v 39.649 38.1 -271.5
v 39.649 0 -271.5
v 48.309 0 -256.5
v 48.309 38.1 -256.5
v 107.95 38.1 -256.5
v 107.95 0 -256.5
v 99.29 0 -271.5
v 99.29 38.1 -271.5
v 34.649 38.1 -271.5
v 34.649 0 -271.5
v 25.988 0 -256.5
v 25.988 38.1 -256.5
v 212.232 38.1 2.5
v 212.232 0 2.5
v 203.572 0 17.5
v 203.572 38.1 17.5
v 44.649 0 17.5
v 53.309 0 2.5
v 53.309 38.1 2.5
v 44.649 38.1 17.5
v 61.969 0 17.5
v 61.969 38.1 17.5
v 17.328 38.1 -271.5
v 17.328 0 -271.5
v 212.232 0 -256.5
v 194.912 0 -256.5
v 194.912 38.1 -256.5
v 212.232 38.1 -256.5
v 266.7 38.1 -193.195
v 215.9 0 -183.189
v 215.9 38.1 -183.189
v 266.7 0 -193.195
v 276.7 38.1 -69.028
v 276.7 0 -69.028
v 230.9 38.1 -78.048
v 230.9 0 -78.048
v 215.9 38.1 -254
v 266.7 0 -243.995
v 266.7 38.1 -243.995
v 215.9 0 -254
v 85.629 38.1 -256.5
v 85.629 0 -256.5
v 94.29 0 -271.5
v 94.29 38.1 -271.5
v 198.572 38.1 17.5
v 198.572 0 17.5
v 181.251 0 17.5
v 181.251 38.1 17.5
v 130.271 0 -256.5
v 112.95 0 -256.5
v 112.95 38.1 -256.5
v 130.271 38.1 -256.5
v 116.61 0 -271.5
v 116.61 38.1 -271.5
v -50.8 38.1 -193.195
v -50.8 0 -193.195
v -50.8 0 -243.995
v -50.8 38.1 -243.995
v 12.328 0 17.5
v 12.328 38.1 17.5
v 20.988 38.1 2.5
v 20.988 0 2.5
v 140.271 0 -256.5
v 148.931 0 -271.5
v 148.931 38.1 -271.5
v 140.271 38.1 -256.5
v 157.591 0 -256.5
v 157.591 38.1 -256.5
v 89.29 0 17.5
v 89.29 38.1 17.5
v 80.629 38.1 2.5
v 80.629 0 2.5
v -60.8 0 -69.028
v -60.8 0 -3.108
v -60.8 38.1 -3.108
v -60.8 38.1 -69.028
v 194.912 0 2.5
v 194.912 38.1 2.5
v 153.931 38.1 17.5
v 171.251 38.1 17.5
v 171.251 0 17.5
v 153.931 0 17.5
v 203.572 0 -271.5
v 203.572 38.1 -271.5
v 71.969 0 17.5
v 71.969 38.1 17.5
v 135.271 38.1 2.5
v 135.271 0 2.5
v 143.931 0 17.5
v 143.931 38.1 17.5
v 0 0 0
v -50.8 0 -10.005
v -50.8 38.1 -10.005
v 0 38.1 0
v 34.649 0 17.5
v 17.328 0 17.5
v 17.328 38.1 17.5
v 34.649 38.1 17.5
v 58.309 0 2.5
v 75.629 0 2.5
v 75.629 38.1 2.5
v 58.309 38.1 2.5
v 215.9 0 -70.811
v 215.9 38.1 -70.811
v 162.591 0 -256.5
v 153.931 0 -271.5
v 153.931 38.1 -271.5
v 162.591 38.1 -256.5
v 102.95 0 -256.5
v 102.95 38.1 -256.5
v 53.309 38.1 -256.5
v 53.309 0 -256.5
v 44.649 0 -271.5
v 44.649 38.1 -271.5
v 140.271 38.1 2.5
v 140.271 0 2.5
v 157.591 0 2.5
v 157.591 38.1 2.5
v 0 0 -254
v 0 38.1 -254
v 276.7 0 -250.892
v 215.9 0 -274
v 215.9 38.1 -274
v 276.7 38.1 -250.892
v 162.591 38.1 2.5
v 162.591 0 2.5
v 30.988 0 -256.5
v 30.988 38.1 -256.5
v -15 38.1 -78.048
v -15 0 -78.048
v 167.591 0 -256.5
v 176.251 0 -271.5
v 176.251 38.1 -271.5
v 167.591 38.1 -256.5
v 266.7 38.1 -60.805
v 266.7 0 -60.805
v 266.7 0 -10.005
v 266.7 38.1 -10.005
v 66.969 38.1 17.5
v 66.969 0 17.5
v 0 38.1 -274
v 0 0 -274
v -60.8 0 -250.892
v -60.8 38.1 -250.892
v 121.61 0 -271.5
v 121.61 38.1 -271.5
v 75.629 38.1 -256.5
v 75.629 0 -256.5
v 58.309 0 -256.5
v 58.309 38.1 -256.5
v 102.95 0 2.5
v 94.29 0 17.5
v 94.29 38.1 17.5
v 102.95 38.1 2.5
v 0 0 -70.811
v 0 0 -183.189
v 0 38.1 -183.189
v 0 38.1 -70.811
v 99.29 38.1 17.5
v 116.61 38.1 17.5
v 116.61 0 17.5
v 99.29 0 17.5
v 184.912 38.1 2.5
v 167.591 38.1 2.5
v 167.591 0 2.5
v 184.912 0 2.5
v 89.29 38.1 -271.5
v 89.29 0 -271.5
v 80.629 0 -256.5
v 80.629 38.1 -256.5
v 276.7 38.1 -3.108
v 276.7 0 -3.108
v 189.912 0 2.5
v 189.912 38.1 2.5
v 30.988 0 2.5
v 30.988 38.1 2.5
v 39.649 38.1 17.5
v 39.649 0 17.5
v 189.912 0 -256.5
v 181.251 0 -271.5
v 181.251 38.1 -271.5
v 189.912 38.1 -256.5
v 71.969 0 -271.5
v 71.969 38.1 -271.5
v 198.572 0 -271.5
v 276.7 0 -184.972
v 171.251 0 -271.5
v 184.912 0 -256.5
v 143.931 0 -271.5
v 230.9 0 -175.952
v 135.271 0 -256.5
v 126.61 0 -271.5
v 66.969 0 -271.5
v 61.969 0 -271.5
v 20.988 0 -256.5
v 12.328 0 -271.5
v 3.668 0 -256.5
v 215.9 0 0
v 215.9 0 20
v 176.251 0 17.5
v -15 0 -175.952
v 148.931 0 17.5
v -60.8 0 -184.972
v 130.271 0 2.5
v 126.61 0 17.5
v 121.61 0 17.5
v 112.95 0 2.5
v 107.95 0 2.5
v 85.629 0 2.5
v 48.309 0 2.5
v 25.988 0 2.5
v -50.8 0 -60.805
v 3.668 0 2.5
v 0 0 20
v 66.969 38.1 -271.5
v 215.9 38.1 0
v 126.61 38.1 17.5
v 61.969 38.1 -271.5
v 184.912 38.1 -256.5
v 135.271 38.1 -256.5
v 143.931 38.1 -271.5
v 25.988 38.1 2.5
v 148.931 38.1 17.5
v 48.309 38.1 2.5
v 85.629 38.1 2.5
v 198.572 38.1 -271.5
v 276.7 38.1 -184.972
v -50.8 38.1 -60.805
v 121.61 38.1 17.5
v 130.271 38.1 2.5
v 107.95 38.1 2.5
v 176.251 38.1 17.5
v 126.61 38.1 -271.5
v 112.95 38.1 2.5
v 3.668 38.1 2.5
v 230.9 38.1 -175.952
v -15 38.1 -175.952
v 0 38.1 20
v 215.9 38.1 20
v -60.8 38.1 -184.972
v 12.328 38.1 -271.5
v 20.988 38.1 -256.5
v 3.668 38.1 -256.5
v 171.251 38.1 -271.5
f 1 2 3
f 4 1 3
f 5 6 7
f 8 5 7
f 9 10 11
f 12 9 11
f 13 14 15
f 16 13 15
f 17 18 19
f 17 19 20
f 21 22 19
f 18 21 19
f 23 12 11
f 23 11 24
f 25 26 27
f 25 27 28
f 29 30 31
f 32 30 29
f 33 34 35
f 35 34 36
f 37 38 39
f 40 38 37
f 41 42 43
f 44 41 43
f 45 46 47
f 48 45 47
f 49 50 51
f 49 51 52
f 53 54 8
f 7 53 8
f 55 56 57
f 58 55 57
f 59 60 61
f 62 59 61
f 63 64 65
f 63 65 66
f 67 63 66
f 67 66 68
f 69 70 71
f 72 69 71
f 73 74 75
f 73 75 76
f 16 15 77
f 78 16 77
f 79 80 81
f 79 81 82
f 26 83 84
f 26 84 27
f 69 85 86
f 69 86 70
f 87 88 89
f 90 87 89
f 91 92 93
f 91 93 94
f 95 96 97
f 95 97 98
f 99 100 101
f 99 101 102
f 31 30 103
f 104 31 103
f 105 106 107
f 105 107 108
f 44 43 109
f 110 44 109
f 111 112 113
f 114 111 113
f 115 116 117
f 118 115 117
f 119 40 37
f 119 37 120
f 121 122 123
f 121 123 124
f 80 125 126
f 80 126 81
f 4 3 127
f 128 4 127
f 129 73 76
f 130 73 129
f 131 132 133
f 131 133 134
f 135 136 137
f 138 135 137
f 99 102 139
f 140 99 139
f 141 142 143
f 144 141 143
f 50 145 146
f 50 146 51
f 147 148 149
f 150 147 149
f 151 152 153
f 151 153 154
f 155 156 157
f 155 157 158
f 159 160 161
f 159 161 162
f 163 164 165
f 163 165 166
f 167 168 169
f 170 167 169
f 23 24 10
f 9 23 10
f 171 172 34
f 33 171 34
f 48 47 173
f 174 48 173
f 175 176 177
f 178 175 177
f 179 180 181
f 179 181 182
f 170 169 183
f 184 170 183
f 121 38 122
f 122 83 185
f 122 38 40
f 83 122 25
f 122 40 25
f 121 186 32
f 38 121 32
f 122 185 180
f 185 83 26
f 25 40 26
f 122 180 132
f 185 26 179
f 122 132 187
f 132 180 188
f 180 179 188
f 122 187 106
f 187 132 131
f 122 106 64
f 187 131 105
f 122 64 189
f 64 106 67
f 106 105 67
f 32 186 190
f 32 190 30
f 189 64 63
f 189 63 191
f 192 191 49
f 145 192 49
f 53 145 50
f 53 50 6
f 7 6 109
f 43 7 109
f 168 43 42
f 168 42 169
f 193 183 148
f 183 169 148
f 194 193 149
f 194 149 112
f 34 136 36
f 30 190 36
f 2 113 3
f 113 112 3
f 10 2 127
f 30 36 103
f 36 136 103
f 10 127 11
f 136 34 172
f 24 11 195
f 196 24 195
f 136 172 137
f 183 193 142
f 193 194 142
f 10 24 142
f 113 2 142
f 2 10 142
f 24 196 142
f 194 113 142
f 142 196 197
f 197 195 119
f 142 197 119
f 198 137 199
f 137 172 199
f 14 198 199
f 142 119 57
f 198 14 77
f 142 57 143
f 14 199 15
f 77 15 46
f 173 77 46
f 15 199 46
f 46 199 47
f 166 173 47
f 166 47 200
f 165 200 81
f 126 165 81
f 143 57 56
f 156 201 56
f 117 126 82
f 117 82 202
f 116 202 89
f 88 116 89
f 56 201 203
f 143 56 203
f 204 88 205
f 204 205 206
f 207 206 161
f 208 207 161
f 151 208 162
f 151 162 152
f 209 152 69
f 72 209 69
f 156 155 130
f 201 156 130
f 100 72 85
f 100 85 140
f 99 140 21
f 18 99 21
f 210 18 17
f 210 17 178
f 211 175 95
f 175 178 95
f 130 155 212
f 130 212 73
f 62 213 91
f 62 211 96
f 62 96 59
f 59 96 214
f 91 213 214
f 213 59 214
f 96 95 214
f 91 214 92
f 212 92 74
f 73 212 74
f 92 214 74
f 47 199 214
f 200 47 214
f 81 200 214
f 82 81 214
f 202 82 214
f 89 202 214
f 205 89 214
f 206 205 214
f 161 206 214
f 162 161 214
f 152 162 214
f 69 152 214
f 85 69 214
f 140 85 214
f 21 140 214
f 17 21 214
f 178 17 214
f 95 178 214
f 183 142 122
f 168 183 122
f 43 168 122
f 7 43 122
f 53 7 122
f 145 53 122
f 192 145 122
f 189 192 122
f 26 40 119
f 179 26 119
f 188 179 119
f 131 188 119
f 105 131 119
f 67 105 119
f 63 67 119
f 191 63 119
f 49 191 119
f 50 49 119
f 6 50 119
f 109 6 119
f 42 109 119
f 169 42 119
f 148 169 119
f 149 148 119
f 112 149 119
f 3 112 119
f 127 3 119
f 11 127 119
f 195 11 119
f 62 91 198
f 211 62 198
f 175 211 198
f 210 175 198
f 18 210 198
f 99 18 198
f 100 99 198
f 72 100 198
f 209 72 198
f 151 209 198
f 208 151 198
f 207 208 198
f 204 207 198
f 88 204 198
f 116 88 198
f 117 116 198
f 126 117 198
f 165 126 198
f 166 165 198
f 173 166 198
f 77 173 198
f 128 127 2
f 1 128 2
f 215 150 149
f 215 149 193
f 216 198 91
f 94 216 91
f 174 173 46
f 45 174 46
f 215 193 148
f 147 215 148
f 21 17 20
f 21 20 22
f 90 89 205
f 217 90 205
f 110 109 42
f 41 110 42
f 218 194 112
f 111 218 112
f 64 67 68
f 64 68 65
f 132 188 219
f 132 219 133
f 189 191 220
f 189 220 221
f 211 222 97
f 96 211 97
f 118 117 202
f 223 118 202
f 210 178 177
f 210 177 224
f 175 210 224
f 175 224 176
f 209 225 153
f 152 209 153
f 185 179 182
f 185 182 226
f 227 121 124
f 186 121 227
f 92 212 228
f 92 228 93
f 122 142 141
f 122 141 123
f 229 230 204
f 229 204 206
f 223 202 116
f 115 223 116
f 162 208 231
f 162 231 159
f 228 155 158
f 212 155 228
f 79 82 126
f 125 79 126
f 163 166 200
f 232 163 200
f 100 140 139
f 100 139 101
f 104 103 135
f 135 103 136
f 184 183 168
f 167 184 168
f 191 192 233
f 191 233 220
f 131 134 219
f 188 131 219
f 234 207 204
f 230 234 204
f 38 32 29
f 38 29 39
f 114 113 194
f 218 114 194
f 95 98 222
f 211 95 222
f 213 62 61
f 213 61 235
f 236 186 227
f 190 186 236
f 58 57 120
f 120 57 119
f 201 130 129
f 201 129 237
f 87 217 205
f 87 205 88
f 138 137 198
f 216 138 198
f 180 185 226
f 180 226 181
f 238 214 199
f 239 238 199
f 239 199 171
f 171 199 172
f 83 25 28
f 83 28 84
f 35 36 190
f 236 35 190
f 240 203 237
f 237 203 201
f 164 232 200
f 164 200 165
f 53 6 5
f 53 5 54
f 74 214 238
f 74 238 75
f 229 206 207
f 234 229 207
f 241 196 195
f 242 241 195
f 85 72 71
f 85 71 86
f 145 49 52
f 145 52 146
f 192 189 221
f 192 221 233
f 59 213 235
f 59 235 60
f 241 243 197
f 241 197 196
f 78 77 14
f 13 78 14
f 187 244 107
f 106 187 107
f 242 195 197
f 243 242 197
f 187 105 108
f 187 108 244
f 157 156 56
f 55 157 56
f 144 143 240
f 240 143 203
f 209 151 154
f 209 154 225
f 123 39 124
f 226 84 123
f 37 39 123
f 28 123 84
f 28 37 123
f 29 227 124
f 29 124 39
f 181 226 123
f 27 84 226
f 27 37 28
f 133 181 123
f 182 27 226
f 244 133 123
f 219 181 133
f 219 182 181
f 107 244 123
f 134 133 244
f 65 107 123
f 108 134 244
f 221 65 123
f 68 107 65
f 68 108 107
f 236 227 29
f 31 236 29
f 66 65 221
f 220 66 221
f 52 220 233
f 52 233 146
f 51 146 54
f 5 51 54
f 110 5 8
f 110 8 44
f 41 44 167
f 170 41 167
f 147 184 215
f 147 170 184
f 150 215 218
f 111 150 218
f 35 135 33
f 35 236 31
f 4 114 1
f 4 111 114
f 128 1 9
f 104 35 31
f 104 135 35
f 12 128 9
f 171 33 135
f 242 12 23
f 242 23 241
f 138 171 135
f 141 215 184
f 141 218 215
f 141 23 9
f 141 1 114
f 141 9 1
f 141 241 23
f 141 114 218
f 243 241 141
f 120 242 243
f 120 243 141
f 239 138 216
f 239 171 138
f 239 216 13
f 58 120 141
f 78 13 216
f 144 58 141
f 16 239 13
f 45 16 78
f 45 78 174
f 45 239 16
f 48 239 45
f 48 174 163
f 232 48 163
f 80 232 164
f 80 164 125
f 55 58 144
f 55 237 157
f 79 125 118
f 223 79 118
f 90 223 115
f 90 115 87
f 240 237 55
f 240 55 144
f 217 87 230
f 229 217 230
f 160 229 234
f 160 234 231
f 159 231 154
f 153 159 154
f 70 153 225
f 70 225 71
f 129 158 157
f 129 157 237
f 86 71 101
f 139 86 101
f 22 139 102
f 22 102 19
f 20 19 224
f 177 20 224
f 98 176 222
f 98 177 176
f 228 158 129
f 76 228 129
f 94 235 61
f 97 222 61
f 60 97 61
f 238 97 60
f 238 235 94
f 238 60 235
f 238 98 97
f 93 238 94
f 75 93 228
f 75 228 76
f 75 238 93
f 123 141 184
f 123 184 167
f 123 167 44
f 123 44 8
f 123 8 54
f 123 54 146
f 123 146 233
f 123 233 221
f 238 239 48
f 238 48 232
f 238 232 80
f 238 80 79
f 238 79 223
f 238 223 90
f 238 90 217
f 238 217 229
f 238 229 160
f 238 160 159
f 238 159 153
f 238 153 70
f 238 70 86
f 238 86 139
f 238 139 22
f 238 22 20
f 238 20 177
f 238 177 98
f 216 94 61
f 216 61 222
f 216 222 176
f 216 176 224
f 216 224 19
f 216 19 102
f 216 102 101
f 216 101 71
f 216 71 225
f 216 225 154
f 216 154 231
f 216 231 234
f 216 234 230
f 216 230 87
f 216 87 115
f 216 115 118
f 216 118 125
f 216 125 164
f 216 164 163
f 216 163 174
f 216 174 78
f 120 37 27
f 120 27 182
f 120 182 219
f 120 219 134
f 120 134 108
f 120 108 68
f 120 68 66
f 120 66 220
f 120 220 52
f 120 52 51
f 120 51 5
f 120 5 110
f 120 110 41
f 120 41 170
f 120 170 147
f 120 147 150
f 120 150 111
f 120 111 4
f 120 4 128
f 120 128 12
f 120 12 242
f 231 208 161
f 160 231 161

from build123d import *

# Parameters (mm, degrees)
BOSS_EXTRUDE1_DEPTH = 38.1


with BuildPart() as part:
    # Sketch1 → Boss-Extrude1 (new body)
    # profile 1 of 2: a face of its own
    with BuildSketch(Plane(origin=(0, 0, 0), x_dir=(1, 0, 0), z_dir=(0, 1, 0))):
        Polygon((0, 254), (0, 274), (-60.8, 250.891892714), (-60.8, 184.972107286), (-15, 175.951549331), (-15, 127), (0, 127), (0, 183.18932995), (-50.8, 193.194664975), (-50.8, 243.994664975), align=None)
    # profile 2 of 2: a face of its own
    with BuildSketch(Plane(origin=(0, 0, 0), x_dir=(1, 0, 0), z_dir=(0, 1, 0))):
        Polygon((99.289745962, 271.5), (107.95, 271.5), (107.95, 274), (0, 274), (0, 254), (107.95, 254), (107.95, 256.5), align=None)
        Polygon((85.629491924, 256.5), (94.289745962, 271.5), (102.95, 256.5), align=None, mode=Mode.SUBTRACT)
        Polygon((58.308983849, 256.5), (66.969237886, 271.5), (75.629491924, 256.5), align=None, mode=Mode.SUBTRACT)
        Polygon((89.289745962, 271.5), (80.629491924, 256.5), (71.969237886, 271.5), align=None, mode=Mode.SUBTRACT)
        Polygon((30.988475773, 256.5), (39.648729811, 271.5), (48.308983849, 256.5), align=None, mode=Mode.SUBTRACT)
        Polygon((61.969237886, 271.5), (53.308983849, 256.5), (44.648729811, 271.5), align=None, mode=Mode.SUBTRACT)
        Polygon((34.648729811, 271.5), (25.988475773, 256.5), (17.328221735, 271.5), align=None, mode=Mode.SUBTRACT)
        Polygon((12.328221735, 271.5), (20.988475773, 256.5), (3.667967697, 256.5), align=None, mode=Mode.SUBTRACT)
    extrude(amount=BOSS_EXTRUDE1_DEPTH)

    # Mirror1: part across plane


with BuildPart() as part_1:
    add(part.part)
    add(part.part.mirror(Plane(origin=(0, 38.1, -127), x_dir=(1, 0, 0), z_dir=(0, 0, -1))))

    # Mirror2: part across plane


with BuildPart() as part_2:
    add(part_1.part)
    add(part_1.part.mirror(Plane(origin=(107.95, 38.1, -254), x_dir=(0, 0, 1), z_dir=(-1, 0, 0))))


solid = part_2.part
